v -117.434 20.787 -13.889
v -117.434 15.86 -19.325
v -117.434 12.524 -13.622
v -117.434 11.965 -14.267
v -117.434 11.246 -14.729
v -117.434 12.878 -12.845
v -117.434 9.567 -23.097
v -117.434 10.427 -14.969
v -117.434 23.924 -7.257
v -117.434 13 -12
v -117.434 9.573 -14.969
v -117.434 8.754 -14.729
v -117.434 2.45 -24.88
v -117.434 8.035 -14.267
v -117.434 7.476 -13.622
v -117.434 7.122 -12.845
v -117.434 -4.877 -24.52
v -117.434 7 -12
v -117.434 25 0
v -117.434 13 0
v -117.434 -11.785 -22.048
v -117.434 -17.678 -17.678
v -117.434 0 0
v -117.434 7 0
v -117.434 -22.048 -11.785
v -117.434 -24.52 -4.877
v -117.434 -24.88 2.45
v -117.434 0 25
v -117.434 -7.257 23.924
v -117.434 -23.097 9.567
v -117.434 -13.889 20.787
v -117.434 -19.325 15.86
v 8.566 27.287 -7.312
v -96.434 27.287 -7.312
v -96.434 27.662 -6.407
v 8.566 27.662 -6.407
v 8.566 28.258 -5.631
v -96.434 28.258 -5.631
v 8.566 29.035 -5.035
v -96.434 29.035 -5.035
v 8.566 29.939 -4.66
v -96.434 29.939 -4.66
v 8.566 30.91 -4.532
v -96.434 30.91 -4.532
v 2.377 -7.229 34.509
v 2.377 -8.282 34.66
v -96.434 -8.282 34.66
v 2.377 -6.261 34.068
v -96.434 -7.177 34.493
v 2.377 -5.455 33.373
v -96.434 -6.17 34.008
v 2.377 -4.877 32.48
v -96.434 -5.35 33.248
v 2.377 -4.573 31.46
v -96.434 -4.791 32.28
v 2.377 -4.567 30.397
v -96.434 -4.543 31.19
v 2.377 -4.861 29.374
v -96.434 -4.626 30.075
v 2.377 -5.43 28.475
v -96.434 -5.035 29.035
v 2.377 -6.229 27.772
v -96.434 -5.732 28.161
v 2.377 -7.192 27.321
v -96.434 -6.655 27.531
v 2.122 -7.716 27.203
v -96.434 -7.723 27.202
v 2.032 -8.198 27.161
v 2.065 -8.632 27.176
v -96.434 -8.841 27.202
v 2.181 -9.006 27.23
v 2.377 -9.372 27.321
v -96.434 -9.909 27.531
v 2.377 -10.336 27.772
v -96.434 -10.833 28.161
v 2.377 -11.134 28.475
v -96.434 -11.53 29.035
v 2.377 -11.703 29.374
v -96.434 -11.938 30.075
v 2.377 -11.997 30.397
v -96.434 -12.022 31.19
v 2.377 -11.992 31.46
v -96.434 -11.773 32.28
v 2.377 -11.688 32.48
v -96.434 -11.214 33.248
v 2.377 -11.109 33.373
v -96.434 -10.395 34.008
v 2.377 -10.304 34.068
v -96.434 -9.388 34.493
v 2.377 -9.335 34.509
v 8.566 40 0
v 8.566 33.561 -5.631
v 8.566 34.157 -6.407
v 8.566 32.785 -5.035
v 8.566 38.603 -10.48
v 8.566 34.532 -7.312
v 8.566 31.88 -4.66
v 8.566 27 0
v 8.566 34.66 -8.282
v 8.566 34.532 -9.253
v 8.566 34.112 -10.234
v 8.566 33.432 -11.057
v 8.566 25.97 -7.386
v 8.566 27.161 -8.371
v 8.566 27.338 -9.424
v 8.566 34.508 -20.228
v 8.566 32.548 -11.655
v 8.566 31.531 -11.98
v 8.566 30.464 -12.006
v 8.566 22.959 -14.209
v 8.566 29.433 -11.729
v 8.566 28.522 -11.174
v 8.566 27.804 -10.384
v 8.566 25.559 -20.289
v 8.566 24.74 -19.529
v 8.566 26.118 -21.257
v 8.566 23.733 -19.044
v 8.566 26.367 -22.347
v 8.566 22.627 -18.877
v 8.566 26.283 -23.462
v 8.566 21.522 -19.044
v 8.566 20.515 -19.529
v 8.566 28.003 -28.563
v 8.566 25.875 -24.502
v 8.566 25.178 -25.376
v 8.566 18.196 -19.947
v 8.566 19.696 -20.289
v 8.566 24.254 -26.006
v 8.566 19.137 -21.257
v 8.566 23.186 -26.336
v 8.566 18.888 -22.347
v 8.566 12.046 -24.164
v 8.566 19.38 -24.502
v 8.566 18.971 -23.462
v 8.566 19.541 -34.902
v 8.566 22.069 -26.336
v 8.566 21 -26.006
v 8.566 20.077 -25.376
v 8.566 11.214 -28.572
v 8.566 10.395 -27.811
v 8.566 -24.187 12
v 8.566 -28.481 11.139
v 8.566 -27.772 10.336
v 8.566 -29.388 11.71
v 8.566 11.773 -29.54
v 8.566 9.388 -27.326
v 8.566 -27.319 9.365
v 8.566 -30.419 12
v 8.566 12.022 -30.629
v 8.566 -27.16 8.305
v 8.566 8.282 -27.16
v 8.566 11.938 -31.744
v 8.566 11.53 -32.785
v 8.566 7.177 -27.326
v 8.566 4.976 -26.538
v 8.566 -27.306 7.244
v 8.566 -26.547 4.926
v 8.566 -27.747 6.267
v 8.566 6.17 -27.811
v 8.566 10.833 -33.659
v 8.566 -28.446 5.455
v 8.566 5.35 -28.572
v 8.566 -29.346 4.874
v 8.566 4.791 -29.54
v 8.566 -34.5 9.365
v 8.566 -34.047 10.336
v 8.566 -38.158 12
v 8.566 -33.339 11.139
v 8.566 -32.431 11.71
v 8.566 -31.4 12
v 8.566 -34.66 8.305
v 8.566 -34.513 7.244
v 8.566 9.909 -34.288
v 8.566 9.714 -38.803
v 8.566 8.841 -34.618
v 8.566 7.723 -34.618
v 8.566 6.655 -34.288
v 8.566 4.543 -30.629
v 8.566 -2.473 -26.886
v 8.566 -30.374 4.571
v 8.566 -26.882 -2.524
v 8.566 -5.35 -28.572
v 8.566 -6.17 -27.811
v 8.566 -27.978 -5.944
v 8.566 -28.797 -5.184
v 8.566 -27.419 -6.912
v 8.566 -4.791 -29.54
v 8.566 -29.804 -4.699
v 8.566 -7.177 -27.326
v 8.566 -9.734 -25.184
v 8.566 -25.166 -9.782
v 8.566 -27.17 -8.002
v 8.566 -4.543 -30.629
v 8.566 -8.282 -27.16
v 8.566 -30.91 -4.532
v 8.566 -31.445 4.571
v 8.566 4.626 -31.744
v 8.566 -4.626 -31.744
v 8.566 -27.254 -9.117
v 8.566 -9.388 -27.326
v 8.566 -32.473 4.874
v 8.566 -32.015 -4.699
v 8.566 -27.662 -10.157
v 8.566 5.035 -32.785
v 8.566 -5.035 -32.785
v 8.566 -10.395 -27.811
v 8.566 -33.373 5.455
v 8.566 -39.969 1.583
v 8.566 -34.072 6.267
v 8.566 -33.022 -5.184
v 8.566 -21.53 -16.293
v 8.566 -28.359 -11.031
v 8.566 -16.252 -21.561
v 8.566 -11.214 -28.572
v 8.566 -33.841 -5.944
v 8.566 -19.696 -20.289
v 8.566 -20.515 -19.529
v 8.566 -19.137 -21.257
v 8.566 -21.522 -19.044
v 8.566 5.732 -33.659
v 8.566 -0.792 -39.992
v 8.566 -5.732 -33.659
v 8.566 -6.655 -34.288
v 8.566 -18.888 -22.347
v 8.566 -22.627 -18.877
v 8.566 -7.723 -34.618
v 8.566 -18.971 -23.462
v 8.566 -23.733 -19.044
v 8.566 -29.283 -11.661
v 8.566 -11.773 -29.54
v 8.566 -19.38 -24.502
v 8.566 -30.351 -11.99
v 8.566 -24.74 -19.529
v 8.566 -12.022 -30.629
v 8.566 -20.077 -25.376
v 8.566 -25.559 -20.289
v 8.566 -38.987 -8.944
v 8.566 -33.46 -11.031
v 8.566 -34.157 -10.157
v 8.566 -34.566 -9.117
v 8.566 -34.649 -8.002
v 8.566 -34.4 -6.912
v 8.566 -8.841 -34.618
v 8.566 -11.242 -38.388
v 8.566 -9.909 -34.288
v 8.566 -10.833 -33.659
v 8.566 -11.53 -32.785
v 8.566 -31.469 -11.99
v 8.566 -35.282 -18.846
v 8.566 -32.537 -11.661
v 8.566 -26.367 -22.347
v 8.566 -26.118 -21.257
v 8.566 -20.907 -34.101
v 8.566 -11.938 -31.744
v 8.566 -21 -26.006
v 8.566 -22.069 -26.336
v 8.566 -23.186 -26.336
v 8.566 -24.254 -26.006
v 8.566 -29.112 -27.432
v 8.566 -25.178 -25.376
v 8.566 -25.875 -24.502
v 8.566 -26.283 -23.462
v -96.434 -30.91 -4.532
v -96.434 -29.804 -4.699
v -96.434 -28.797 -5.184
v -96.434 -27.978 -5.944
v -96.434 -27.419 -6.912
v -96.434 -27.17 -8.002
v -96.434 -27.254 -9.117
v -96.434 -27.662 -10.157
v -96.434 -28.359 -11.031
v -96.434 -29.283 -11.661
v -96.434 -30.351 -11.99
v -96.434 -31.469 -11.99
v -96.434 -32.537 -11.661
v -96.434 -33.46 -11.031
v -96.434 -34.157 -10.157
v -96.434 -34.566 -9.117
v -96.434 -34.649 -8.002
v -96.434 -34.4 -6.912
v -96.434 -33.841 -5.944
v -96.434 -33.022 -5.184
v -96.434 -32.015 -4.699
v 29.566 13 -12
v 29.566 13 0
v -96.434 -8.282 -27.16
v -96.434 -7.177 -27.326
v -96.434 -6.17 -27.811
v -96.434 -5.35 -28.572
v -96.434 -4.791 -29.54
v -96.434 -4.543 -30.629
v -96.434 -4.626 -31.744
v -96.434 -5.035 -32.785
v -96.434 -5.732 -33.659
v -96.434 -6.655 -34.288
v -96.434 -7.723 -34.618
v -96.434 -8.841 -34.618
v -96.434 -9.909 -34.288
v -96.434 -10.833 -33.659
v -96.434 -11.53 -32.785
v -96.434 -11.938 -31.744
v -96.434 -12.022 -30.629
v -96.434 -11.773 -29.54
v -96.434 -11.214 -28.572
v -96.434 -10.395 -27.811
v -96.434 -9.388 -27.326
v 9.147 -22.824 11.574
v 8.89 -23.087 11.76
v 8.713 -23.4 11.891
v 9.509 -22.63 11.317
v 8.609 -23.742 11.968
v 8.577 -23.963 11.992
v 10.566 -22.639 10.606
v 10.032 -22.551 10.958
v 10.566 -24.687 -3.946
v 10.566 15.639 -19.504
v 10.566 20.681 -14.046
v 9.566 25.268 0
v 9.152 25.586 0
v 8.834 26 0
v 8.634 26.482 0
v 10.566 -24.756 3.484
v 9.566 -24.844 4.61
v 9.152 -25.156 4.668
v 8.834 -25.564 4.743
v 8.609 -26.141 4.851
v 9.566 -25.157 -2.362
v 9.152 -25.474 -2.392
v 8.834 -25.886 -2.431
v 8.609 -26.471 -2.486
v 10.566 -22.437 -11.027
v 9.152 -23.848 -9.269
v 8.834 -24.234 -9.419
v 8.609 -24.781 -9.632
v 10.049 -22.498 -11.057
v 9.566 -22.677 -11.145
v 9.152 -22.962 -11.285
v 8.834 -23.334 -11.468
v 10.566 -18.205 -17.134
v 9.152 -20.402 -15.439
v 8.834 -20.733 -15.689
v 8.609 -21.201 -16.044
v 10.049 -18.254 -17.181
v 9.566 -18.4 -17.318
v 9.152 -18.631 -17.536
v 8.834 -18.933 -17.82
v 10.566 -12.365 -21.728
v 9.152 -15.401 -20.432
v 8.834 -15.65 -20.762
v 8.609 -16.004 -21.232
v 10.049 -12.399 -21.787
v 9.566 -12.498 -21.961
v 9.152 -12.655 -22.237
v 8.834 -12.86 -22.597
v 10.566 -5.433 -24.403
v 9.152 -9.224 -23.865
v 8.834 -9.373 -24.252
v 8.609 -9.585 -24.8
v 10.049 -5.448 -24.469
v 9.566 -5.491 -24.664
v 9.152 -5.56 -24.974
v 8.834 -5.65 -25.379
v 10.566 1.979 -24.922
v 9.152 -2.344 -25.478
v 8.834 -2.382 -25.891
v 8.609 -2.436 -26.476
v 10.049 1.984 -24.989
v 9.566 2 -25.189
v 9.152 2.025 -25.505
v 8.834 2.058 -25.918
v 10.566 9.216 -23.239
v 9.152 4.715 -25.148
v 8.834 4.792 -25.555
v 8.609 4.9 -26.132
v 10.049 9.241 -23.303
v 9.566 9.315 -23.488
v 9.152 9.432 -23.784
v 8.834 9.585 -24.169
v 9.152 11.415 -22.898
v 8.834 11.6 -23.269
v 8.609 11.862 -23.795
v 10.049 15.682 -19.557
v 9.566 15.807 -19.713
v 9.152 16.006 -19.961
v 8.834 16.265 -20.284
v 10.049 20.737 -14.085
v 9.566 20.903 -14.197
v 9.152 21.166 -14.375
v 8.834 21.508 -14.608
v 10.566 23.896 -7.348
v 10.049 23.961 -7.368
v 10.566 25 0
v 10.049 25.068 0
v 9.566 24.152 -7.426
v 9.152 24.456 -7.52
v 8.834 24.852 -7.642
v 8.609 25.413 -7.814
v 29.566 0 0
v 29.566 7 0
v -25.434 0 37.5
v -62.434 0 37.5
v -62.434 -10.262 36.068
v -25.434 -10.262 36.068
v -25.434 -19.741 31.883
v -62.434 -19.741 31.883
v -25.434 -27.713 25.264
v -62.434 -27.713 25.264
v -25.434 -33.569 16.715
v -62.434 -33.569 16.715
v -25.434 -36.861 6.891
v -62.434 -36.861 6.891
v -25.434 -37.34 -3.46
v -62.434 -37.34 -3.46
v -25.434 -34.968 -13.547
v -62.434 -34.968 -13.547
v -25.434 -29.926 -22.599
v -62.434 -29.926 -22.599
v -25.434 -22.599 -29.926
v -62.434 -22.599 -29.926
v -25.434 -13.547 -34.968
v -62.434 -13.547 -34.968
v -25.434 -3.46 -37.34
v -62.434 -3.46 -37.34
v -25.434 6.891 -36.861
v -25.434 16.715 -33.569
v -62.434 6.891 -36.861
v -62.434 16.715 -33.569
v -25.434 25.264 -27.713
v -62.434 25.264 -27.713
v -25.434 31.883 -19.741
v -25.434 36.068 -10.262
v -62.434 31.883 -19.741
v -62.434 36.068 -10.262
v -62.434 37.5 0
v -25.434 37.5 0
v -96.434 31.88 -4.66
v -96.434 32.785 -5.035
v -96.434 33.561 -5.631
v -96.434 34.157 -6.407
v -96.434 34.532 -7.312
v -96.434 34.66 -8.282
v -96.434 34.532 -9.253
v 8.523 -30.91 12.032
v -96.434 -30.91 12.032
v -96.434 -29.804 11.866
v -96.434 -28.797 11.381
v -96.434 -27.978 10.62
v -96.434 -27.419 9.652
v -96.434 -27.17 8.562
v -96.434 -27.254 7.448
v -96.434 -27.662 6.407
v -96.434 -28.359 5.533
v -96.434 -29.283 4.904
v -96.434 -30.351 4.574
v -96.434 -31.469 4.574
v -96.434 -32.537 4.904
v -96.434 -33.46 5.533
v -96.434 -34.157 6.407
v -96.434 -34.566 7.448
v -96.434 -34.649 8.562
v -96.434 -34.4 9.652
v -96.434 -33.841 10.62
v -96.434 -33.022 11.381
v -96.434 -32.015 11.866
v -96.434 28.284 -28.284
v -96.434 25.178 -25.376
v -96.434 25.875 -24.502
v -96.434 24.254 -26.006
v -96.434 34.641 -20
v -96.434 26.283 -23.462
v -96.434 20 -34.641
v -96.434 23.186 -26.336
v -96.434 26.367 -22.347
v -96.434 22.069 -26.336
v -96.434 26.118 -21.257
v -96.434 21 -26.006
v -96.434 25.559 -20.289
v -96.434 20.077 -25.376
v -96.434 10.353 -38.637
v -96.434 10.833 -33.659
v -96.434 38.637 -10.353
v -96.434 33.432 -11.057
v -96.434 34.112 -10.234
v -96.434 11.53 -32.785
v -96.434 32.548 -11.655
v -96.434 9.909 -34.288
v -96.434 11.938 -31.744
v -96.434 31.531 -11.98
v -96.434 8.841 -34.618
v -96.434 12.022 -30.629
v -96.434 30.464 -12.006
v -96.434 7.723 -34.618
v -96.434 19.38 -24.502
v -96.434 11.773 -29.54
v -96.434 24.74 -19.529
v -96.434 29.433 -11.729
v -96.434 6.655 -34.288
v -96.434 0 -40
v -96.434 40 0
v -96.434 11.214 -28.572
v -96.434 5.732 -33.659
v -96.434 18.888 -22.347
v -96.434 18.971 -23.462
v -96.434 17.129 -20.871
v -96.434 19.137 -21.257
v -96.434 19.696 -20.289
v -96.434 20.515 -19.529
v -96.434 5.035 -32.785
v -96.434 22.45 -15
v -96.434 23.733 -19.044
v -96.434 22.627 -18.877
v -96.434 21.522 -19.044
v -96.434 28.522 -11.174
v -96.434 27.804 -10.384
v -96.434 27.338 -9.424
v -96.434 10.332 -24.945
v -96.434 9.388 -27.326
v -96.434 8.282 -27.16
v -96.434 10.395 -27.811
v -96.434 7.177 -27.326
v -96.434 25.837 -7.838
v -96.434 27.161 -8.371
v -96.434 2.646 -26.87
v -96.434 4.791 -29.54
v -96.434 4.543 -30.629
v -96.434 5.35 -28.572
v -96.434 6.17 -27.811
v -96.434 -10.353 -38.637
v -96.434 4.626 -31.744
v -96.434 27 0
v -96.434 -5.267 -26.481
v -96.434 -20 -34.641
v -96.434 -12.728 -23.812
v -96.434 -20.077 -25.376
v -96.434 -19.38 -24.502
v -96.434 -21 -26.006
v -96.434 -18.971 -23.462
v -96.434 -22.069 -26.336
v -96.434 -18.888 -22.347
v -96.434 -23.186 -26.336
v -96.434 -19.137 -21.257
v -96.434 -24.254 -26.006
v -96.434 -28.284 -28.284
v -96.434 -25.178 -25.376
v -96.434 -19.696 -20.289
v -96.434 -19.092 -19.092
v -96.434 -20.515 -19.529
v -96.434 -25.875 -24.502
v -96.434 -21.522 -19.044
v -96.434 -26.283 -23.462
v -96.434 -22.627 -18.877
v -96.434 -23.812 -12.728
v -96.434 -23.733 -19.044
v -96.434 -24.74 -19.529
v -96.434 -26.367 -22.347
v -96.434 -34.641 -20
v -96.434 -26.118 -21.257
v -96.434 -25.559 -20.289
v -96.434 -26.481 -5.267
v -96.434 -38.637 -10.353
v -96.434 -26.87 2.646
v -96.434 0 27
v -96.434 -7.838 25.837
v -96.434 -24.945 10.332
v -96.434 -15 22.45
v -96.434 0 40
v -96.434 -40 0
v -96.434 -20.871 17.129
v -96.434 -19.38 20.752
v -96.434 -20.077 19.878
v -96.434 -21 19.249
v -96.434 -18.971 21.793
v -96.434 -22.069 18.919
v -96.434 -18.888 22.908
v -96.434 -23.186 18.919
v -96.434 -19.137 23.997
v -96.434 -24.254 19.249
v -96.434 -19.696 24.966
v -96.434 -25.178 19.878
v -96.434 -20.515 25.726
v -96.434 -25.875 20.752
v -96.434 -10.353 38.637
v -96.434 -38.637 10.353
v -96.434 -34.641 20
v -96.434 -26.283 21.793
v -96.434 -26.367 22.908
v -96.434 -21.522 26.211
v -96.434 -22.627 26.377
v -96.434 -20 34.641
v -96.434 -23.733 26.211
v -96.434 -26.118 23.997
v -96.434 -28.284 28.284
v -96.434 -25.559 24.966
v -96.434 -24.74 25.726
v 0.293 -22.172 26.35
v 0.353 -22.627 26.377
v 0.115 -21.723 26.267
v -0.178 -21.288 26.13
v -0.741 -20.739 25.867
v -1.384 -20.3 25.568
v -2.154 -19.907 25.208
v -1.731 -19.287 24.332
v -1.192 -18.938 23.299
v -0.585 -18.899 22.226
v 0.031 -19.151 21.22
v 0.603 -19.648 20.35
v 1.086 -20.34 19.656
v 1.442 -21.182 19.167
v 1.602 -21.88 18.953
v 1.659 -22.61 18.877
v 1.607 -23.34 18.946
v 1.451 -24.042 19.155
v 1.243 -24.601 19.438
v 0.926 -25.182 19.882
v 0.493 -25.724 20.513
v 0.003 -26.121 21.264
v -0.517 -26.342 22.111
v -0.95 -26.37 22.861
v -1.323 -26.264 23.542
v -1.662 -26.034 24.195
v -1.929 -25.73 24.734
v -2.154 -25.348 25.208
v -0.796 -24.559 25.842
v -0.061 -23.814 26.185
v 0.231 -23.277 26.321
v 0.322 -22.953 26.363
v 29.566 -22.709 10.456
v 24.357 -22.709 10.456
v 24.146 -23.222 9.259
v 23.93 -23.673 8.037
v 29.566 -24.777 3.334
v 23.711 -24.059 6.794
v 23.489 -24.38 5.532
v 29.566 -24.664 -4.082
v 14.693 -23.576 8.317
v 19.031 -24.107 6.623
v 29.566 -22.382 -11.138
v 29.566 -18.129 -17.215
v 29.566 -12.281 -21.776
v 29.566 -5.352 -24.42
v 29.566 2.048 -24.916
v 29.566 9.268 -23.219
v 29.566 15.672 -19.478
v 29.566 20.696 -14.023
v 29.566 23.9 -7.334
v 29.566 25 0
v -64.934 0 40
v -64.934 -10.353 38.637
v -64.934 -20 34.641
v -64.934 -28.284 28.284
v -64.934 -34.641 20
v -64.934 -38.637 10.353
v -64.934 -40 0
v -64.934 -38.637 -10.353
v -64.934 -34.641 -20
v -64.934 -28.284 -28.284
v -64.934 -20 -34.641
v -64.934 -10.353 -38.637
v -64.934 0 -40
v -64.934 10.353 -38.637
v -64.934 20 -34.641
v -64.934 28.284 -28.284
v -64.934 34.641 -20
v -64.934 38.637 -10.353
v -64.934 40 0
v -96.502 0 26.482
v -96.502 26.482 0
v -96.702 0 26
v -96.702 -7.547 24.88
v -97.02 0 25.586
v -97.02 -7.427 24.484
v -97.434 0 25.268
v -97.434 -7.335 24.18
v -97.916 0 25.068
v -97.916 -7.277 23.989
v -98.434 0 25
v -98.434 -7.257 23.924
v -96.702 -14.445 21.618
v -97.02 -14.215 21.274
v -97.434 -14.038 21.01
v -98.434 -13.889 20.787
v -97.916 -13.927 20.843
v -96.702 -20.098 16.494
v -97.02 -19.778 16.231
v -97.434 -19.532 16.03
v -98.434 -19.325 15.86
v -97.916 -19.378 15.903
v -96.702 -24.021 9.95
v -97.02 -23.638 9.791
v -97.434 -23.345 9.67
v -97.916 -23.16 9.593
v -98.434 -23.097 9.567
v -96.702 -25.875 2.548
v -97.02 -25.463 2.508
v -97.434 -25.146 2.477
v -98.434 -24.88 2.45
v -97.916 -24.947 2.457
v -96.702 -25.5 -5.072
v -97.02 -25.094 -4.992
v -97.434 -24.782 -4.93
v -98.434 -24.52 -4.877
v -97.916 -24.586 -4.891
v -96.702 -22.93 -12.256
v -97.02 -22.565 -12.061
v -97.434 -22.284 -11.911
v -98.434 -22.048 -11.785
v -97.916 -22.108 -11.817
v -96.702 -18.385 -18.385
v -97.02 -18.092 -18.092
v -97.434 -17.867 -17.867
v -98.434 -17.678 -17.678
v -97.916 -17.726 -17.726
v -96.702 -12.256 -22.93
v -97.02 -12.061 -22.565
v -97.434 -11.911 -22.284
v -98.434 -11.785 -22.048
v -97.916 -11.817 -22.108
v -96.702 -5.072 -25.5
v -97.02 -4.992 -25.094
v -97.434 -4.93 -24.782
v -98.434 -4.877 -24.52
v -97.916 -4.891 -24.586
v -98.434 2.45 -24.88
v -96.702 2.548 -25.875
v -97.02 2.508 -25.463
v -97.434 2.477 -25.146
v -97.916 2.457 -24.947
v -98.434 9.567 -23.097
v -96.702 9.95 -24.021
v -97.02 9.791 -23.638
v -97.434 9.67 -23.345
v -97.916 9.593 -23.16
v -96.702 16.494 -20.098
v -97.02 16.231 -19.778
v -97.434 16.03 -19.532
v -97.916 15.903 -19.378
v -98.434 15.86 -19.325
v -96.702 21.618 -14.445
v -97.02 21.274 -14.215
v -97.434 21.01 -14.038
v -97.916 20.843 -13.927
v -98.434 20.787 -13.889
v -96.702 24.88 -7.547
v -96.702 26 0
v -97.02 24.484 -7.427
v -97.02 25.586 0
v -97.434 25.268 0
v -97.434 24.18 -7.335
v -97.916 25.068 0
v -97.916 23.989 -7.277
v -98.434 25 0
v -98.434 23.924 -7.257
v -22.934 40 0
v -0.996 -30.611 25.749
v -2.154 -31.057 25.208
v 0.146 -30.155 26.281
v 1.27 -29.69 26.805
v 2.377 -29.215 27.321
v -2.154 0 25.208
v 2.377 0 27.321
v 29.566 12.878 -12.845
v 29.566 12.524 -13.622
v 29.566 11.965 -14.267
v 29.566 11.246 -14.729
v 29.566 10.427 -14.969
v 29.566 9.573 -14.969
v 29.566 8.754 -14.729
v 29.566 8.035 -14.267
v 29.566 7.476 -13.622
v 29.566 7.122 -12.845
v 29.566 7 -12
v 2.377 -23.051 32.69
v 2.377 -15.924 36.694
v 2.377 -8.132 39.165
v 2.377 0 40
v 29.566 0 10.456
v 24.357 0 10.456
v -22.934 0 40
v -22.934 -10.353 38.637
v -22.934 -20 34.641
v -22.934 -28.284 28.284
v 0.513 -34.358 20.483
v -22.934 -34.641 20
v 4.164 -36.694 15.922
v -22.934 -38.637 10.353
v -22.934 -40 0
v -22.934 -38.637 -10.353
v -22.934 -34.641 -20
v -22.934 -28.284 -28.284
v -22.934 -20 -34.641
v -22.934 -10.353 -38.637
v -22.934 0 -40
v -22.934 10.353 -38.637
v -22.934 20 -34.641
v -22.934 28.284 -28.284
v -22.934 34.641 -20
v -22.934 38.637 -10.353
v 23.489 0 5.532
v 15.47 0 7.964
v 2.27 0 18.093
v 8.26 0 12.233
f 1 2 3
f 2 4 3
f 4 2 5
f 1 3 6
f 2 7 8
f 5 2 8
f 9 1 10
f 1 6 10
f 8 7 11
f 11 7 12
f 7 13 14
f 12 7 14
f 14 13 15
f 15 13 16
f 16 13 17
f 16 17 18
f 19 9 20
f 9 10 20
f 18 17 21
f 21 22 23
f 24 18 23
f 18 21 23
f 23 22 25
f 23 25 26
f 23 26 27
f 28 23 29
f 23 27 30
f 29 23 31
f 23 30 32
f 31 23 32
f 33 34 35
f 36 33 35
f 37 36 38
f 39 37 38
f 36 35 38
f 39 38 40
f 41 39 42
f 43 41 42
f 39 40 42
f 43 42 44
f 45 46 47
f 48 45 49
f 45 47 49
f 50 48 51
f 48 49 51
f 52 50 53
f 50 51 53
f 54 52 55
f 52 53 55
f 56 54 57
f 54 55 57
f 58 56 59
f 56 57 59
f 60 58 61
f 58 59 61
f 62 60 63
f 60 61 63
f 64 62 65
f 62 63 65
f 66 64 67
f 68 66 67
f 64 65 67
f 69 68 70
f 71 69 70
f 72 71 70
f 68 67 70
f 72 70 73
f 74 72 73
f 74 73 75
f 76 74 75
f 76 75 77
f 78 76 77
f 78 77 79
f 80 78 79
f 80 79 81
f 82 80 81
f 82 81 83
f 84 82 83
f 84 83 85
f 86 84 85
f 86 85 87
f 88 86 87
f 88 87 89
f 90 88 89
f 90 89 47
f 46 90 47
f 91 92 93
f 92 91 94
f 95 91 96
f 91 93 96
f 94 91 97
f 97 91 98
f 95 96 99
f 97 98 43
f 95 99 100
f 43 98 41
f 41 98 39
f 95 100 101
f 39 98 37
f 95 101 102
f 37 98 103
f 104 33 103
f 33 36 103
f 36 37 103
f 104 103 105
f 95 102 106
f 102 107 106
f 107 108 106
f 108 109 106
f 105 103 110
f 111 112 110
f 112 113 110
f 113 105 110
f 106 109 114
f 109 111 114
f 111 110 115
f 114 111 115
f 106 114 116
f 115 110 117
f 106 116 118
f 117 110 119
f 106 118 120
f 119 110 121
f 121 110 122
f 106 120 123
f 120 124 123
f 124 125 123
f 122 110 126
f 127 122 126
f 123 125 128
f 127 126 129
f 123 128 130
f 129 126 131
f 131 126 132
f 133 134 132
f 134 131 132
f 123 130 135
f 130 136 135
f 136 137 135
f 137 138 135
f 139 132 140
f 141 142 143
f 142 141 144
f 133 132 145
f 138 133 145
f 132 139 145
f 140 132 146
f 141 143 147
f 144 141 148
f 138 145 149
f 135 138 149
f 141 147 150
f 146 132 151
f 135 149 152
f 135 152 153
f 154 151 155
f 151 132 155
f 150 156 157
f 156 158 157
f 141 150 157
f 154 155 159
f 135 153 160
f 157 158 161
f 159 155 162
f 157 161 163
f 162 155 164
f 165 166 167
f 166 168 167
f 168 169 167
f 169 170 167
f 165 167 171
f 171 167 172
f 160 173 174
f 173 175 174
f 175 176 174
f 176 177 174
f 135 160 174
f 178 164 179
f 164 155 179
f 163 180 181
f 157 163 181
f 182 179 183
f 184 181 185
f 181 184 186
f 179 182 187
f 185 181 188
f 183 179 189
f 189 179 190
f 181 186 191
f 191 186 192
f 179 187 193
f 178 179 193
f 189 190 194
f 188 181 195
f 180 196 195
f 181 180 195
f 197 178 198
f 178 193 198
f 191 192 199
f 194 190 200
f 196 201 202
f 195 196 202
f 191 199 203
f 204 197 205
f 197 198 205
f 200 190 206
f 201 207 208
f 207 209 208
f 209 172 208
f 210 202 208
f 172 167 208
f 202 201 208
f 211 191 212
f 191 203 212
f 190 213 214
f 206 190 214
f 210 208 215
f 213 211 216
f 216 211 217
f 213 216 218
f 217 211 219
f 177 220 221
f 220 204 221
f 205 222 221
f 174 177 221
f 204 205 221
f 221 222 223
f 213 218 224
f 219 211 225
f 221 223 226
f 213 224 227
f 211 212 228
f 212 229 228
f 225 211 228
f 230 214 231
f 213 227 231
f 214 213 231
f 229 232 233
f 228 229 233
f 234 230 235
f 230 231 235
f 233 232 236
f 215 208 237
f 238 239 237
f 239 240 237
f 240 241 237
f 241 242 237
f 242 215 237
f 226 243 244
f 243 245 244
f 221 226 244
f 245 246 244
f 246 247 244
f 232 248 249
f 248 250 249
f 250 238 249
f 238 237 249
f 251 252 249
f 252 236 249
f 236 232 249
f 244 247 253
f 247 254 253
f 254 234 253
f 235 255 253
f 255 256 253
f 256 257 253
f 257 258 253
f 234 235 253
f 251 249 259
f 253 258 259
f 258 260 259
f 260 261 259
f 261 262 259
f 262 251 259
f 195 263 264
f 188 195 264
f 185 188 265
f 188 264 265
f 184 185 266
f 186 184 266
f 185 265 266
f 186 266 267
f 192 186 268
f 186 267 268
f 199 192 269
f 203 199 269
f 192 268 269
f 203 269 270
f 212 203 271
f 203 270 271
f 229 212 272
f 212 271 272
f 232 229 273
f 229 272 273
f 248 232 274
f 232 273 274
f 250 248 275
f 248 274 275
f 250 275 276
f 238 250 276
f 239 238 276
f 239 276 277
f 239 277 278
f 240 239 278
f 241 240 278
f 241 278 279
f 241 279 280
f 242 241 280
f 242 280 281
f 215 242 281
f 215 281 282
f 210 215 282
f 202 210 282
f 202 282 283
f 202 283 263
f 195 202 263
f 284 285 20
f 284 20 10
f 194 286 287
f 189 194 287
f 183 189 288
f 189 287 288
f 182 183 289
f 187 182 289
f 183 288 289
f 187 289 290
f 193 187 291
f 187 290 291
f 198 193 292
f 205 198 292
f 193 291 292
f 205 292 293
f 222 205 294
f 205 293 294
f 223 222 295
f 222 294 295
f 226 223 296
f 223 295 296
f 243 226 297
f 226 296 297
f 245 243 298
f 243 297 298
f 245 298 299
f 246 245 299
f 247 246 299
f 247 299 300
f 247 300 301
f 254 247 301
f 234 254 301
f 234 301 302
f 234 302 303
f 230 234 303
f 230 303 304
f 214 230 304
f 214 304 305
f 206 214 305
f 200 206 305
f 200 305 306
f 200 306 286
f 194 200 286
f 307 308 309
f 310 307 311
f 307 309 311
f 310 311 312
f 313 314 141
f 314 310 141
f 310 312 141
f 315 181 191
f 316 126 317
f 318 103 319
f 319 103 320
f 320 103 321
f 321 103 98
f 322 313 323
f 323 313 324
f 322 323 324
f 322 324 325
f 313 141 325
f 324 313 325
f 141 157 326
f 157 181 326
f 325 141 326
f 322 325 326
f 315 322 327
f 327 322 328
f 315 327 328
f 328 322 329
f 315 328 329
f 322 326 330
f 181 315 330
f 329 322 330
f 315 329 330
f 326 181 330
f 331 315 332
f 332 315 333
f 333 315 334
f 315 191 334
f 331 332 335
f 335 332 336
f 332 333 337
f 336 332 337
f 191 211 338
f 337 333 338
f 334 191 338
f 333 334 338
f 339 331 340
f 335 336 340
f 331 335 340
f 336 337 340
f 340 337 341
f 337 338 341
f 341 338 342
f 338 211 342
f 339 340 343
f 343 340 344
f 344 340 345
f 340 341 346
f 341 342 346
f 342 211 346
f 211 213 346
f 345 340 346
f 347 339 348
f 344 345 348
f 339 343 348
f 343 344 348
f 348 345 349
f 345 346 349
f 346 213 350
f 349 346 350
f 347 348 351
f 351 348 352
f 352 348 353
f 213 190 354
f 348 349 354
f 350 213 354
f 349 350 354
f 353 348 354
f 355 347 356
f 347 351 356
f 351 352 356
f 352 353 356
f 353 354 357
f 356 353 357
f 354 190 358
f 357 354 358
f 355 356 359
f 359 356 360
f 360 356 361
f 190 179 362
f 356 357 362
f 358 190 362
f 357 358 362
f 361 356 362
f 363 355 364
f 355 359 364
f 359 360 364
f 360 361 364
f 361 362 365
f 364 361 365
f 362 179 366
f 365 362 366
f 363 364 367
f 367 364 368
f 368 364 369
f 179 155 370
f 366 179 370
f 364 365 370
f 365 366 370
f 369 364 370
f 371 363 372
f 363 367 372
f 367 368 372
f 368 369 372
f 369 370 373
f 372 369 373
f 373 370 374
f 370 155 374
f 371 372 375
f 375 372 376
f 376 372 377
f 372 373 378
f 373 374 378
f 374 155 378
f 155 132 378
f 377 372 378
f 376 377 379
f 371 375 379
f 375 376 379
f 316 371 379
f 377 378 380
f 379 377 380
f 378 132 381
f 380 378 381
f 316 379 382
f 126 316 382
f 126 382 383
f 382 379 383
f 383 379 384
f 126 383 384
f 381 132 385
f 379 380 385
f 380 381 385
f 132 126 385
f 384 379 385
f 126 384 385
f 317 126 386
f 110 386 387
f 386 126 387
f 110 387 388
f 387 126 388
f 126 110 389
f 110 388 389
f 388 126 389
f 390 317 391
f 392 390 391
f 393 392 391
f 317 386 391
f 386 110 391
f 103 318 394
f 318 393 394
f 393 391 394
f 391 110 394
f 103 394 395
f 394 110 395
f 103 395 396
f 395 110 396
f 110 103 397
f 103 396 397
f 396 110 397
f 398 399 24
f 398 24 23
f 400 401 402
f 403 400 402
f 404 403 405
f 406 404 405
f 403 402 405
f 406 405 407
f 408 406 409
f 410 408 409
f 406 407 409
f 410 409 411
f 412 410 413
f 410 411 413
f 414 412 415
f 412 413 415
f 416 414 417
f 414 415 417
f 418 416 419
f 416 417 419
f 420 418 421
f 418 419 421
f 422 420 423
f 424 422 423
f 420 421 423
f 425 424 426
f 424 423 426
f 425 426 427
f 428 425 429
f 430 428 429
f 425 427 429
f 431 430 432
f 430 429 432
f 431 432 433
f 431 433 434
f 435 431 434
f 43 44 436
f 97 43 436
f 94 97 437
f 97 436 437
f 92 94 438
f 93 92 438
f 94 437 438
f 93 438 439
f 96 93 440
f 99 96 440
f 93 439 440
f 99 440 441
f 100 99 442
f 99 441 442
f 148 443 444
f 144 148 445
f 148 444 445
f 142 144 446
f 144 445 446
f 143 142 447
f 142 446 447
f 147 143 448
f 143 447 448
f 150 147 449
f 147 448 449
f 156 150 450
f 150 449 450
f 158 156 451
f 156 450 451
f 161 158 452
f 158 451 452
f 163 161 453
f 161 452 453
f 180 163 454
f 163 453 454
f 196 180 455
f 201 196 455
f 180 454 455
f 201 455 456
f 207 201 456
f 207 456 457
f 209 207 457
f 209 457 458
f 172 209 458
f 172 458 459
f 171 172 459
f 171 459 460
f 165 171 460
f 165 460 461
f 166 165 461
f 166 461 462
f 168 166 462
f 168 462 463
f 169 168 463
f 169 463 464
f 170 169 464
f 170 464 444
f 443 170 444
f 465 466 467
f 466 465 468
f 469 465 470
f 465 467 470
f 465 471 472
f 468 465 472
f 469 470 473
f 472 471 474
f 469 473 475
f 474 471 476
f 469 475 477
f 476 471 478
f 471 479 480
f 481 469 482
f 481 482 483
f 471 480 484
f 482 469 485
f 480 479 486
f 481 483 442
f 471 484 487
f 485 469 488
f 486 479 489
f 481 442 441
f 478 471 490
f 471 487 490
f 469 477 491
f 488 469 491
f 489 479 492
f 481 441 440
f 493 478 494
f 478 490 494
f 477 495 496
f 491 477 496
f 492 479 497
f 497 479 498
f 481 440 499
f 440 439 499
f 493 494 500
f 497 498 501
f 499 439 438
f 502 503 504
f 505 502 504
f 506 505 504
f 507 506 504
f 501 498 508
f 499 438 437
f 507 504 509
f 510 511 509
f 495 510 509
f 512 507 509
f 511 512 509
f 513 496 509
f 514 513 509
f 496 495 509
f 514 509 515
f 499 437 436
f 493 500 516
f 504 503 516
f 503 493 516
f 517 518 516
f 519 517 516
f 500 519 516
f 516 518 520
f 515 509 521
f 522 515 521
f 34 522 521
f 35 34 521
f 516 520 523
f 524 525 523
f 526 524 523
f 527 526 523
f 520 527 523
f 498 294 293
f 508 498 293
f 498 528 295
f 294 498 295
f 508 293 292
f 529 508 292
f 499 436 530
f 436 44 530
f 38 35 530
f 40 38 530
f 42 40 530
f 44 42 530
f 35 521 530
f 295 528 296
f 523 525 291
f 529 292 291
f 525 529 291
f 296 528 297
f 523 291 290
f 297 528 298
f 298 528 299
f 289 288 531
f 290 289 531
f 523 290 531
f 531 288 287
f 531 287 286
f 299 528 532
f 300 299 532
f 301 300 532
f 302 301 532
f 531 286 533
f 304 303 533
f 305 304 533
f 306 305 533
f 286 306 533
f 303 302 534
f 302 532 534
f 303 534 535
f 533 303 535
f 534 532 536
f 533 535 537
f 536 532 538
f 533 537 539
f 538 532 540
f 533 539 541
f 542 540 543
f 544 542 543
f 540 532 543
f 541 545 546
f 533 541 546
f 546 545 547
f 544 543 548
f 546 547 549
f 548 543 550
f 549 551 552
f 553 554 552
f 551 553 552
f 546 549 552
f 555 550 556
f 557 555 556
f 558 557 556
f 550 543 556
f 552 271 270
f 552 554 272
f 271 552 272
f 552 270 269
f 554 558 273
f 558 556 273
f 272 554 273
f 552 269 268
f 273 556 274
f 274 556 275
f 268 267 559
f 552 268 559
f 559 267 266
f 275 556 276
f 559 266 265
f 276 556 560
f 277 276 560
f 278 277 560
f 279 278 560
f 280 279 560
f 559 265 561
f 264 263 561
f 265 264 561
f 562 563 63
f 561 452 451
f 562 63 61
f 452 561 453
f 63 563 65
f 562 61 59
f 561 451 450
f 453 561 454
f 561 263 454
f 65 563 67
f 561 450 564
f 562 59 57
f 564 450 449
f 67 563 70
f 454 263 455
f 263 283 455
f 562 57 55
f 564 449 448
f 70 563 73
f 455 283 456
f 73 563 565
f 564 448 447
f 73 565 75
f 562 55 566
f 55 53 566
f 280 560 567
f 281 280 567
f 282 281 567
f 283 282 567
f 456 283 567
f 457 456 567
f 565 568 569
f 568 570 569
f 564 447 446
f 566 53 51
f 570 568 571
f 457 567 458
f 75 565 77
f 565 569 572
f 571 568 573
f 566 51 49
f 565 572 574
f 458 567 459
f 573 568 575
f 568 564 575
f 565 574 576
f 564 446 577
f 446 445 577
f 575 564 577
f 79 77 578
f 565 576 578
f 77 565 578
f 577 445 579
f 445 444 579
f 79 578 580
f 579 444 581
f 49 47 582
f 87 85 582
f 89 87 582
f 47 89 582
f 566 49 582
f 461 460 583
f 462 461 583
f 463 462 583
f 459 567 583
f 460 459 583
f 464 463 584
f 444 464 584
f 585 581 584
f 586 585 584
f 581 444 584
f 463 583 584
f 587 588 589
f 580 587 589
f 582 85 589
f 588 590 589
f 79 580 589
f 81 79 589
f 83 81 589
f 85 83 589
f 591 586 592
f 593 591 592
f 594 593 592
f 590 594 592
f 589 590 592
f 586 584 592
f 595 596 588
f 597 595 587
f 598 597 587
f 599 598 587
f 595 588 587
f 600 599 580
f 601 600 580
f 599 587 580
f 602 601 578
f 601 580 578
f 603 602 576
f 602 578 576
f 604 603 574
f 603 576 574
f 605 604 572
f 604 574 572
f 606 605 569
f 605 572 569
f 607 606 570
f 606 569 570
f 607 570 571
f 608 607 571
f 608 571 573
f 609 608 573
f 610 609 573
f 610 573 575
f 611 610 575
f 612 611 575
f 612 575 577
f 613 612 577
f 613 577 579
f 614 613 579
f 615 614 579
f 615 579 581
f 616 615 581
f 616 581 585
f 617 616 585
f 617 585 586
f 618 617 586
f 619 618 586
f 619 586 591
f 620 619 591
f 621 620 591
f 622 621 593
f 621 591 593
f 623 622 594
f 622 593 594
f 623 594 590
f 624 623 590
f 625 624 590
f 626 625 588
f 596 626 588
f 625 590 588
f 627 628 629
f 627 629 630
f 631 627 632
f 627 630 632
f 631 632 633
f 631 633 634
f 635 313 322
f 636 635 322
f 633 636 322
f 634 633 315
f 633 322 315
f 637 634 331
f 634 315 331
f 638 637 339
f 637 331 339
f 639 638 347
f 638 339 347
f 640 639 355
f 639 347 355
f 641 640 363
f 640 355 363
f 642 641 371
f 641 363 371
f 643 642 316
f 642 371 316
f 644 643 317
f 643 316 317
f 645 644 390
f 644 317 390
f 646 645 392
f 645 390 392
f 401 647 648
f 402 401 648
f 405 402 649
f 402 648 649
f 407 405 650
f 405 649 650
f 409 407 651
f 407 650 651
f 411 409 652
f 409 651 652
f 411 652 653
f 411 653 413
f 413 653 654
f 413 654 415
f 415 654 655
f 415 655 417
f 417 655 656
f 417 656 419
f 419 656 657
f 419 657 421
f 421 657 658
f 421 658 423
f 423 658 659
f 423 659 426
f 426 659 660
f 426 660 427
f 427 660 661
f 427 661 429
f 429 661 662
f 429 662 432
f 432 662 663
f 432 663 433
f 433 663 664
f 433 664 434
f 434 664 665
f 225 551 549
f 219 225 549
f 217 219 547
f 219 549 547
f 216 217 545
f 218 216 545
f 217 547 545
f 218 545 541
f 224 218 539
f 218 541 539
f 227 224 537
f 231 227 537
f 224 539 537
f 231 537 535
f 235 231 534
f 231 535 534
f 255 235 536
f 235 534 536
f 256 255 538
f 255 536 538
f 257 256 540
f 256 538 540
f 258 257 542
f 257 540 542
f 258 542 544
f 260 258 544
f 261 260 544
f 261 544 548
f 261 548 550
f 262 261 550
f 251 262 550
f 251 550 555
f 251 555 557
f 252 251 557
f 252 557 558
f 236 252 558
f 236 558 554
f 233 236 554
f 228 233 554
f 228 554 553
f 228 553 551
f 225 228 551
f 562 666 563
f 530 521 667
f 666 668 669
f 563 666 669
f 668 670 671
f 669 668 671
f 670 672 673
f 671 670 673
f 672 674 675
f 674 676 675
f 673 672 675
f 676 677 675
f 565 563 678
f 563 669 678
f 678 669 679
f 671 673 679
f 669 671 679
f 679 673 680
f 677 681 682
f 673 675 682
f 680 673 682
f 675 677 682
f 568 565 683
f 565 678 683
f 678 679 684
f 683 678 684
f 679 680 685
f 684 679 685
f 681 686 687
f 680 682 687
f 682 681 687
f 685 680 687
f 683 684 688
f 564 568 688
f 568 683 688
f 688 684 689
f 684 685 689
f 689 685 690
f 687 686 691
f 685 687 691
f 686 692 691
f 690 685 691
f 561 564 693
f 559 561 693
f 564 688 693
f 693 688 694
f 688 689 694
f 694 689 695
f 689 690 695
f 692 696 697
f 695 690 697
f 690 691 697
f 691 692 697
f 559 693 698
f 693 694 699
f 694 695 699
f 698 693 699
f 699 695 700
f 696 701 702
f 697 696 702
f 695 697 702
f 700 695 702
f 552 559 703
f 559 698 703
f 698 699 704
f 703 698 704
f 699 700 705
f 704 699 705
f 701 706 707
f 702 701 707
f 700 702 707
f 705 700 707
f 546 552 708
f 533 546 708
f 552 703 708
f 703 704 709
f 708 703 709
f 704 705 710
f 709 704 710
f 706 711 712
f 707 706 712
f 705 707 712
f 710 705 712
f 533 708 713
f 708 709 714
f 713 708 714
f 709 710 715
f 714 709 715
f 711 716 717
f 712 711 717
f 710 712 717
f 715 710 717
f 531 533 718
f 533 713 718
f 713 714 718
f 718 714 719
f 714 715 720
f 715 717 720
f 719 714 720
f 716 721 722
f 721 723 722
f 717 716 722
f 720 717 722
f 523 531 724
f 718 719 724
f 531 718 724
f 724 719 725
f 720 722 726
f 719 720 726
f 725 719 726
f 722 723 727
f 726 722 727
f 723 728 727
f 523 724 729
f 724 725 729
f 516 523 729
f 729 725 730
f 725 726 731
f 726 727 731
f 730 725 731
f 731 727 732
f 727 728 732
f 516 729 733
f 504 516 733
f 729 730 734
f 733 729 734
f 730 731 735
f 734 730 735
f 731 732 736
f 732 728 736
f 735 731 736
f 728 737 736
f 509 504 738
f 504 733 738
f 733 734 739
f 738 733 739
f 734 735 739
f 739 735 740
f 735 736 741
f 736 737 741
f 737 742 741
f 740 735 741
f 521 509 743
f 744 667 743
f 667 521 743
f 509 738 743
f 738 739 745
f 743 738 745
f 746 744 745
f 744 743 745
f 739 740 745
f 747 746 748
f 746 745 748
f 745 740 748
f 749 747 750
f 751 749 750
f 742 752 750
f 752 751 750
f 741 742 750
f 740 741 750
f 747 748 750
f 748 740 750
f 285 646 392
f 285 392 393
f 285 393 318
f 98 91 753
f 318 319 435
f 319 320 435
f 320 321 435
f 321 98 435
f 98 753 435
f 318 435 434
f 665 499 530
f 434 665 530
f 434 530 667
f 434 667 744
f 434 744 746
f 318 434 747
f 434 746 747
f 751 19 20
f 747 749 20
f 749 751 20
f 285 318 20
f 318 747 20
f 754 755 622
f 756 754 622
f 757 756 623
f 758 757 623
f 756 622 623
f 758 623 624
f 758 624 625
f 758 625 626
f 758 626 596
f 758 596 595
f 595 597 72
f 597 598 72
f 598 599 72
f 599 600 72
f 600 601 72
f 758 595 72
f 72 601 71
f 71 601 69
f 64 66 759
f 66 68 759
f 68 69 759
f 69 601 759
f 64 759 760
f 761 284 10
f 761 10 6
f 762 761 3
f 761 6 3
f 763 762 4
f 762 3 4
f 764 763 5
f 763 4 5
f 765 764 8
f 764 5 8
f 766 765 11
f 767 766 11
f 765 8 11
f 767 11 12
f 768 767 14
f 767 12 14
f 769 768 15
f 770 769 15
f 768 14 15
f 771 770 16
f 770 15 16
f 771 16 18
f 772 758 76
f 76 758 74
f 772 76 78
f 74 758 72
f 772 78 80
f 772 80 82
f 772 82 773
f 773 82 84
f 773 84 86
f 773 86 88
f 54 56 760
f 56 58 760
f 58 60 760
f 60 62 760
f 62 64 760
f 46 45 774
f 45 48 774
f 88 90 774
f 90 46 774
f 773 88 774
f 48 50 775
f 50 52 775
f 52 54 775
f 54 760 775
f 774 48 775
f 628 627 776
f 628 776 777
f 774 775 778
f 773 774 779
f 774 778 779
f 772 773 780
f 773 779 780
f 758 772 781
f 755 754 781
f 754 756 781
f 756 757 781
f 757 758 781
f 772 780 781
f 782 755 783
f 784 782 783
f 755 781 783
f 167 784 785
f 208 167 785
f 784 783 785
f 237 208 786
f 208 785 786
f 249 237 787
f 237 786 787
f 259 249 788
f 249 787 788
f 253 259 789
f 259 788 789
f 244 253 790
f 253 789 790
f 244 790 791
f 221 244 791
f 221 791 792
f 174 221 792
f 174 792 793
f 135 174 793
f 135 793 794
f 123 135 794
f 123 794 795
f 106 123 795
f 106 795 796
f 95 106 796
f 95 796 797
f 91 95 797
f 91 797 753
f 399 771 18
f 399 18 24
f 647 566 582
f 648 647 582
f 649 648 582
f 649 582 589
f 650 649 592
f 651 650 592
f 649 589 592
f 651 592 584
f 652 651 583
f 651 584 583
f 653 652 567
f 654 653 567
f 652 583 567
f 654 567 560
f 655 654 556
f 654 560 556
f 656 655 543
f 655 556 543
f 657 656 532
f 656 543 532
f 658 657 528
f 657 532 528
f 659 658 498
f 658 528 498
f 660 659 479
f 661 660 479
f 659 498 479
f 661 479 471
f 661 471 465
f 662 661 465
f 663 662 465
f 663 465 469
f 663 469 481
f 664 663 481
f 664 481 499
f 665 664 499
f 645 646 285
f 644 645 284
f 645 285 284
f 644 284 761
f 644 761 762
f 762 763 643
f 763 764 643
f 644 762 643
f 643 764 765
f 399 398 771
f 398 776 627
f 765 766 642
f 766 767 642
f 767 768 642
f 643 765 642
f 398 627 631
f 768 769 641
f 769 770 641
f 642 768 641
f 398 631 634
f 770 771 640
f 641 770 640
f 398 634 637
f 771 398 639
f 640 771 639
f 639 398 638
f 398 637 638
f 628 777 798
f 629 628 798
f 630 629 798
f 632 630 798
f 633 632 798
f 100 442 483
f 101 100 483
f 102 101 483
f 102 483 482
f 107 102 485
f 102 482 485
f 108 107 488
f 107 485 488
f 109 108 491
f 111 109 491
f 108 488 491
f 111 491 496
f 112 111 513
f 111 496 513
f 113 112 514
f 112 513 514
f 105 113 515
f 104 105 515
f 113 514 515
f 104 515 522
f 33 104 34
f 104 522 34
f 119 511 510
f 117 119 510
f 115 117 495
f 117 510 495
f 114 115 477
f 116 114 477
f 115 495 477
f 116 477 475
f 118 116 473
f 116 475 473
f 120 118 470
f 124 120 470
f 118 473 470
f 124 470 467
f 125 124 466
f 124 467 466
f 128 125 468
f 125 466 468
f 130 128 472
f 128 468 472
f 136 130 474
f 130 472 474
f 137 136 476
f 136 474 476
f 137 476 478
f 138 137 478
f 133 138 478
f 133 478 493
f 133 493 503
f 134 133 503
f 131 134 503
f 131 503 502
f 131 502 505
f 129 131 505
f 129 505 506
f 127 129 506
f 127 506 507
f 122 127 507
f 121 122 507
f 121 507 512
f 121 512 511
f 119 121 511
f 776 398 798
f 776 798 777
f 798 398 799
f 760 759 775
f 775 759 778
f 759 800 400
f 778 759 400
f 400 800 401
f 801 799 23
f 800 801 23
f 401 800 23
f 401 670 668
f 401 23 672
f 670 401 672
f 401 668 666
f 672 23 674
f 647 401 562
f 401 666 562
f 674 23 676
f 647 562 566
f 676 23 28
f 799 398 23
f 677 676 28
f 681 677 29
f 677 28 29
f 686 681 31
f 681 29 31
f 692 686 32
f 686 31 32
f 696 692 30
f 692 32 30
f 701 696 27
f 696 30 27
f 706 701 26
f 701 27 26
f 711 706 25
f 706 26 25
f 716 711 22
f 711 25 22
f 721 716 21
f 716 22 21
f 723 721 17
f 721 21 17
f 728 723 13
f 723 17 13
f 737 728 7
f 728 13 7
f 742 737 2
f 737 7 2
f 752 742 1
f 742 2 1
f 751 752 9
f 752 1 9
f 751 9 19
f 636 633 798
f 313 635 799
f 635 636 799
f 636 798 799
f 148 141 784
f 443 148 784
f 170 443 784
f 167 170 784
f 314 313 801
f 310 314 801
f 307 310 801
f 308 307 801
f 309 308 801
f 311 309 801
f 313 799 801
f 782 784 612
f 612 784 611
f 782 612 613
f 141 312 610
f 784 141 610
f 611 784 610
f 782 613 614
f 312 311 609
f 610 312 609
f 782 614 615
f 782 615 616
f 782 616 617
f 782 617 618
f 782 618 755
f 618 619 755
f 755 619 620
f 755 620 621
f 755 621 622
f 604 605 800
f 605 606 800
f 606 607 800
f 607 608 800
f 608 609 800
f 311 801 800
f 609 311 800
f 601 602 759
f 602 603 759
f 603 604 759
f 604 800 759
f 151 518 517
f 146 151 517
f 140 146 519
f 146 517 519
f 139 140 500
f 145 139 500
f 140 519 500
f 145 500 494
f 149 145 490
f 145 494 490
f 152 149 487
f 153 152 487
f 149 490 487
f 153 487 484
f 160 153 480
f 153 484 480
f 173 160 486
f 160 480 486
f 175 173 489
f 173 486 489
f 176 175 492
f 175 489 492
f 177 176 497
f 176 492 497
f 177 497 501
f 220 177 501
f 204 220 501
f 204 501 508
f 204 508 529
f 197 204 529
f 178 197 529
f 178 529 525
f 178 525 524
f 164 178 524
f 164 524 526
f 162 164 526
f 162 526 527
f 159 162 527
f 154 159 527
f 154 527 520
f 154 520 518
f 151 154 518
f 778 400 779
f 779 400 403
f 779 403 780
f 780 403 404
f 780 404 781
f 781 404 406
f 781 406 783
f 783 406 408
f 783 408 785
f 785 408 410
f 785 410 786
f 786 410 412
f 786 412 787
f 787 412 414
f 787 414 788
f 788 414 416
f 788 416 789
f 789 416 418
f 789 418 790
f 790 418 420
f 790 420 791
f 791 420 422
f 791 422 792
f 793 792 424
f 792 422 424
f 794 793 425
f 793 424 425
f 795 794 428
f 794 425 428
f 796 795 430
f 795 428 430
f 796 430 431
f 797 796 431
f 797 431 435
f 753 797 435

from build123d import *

# Parameters (mm, degrees)
ENL_V_MAT_EXTRU_1_DEPTH = 158.508729917
ESQUISSE3_R             = 3.75
ENL_V_MAT_EXTRU_2_DEPTH = 158.508729917
ENL_V_MAT_EXTRU_3_DEPTH = 131.348301481


with BuildPart() as part:
    # Esquisse1 → Révolution1 (revolve)
    with BuildSketch(Plane.XY, mode=Mode.PRIVATE) as r_volution1_sk:
        with BuildLine():
            Line((0, 0), (29.566275292, 0))
            Line((29.566275292, 0), (29.566275292, 25))
            Line((29.566275292, 25), (10.566275292, 25))
            ThreePointArc((10.566275292, 25), (9.152061729, 25.585786438), (8.566275292, 27))
            Line((8.566275292, 27), (8.566275292, 40))
            Line((8.566275292, 40), (-22.933724708, 40))
            Line((-22.933724708, 40), (-25.433724708, 37.5))
            Line((-25.433724708, 37.5), (-62.433724708, 37.5))
            Line((-62.433724708, 37.5), (-64.933724708, 40))
            Line((-64.933724708, 40), (-96.433724708, 40))
            Line((-96.433724708, 40), (-96.433724708, 27))
            ThreePointArc((-96.433724708, 27), (-97.019511146, 25.585786438), (-98.433724708, 25))
            Line((-98.433724708, 25), (-117.433724708, 25))
            Line((-117.433724708, 25), (-117.433724708, 0))
            Line((-117.433724708, 0), (0, 0))
        make_face()
    revolve(r_volution1_sk.sketch.rotate(Axis((-130.768922499, 0, 0), (1, 0, 0)), 90), axis=Axis((-130.768922499, 0, 0), (1, 0, 0)))

    # Esquisse2 → Enlèv. mat.-Extru.1 (cut, through all)
    with BuildSketch(Plane.ZY.offset(117.433724708)):
        with BuildLine():
            Line((0, 7), (0, 0))
            Line((0, 0), (43.449782835, 0))
            Line((43.449782835, 0), (43.449782835, 44.497429883))
            Line((43.449782835, 44.497429883), (0, 44.497429883))
            Line((0, 44.497429883), (0, 13))
            ThreePointArc((0, 13), (3, 10), (0, 7))
        make_face()
        with BuildLine():
            Line((-12, 7), (0, 7))
            ThreePointArc((0, 7), (3, 10), (0, 13))
            Line((0, 13), (-12, 13))
            ThreePointArc((-12, 13), (-15, 10), (-12, 7))
        make_face()
    extrude(amount=-ENL_V_MAT_EXTRU_1_DEPTH, mode=Mode.SUBTRACT)

    # Esquisse3 → Enlèv. mat.-Extru.2 (cut, through all)
    with BuildSketch(Plane.ZY.offset(117.433724708)):
        with BuildLine():
            ThreePointArc((-9.252780862, 34.53184829), (-11.904431292, 29.939055022), (-7.311638024, 27.287404593))
            Line((-7.311638024, 27.287404593), (-9.252780862, 34.53184829))
        make_face()
        with BuildLine():
            Line((-9.252780862, 34.53184829), (-7.311638024, 27.287404593))
            ThreePointArc((-7.311638024, 27.287404593), (-5.307134417, 28.626771082), (-4.532209443, 30.909626441))
            ThreePointArc((-4.532209443, 30.909626441), (-5.999354084, 33.884701467), (-9.252780862, 34.53184829))
        make_face()
        with Locations((-22.627416998, 22.627416998)):
            Circle(ESQUISSE3_R)
        with Locations((-30.909626441, 8.282209443)):
            Circle(ESQUISSE3_R)
        with Locations((-30.909626441, -8.282209443)):
            Circle(ESQUISSE3_R)
        with Locations((-22.627416998, -22.627416998)):
            Circle(ESQUISSE3_R)
        with Locations((-8.282209443, -30.909626441)):
            Circle(ESQUISSE3_R)
        with Locations((8.282209443, -30.909626441)):
            Circle(ESQUISSE3_R)
        with Locations((22.627416998, -22.627416998)):
            Circle(ESQUISSE3_R)
        with Locations((30.909626441, -8.282209443)):
            Circle(ESQUISSE3_R)
    extrude(amount=-ENL_V_MAT_EXTRU_2_DEPTH, mode=Mode.SUBTRACT)

    # Esquisse4 → Enlèv. mat.-Extru.3 (cut, through all)
    with BuildSketch(Plane(origin=(0, 0, 0), x_dir=(1, 0, 0), z_dir=(0, 1, 0))):
        Polygon((8.566275292, -30.207539179), (2.377041681, -27.321452148), (2.377041681, -40), (8.566275292, -40), align=None)
        with BuildLine():
            Line((26.921370581, -25), (24.356829962, -10.45576741))
            ThreePointArc((24.356829962, -10.45576741), (11.303432421, -16.199399791), (2.377041681, -27.321452148))
            Line((2.377041681, -27.321452148), (8.566275292, -30.207539179))
            Line((8.566275292, -30.207539179), (8.566275292, -27))
            ThreePointArc((8.566275292, -27), (9.152061729, -25.585786438), (10.566275292, -25))
            Line((10.566275292, -25), (26.921370581, -25))
        make_face()
        with BuildLine():
            ThreePointArc((2.377041681, -27.321452148), (11.303432421, -16.199399791), (24.356829962, -10.45576741))
            Line((24.356829962, -10.45576741), (23.488589073, -5.531728645))
            ThreePointArc((23.488589073, -5.531728645), (8.259625276, -12.23263309), (-2.154497255, -25.208360839))
            Line((-2.154497255, -25.208360839), (2.377041681, -27.321452148))
        make_face()
        Polygon((29.566275292, -10.45576741), (24.356829962, -10.45576741), (26.921370581, -25), (29.566275292, -25), align=None)
    extrude(amount=-ENL_V_MAT_EXTRU_3_DEPTH, mode=Mode.SUBTRACT)


solid = part.part
